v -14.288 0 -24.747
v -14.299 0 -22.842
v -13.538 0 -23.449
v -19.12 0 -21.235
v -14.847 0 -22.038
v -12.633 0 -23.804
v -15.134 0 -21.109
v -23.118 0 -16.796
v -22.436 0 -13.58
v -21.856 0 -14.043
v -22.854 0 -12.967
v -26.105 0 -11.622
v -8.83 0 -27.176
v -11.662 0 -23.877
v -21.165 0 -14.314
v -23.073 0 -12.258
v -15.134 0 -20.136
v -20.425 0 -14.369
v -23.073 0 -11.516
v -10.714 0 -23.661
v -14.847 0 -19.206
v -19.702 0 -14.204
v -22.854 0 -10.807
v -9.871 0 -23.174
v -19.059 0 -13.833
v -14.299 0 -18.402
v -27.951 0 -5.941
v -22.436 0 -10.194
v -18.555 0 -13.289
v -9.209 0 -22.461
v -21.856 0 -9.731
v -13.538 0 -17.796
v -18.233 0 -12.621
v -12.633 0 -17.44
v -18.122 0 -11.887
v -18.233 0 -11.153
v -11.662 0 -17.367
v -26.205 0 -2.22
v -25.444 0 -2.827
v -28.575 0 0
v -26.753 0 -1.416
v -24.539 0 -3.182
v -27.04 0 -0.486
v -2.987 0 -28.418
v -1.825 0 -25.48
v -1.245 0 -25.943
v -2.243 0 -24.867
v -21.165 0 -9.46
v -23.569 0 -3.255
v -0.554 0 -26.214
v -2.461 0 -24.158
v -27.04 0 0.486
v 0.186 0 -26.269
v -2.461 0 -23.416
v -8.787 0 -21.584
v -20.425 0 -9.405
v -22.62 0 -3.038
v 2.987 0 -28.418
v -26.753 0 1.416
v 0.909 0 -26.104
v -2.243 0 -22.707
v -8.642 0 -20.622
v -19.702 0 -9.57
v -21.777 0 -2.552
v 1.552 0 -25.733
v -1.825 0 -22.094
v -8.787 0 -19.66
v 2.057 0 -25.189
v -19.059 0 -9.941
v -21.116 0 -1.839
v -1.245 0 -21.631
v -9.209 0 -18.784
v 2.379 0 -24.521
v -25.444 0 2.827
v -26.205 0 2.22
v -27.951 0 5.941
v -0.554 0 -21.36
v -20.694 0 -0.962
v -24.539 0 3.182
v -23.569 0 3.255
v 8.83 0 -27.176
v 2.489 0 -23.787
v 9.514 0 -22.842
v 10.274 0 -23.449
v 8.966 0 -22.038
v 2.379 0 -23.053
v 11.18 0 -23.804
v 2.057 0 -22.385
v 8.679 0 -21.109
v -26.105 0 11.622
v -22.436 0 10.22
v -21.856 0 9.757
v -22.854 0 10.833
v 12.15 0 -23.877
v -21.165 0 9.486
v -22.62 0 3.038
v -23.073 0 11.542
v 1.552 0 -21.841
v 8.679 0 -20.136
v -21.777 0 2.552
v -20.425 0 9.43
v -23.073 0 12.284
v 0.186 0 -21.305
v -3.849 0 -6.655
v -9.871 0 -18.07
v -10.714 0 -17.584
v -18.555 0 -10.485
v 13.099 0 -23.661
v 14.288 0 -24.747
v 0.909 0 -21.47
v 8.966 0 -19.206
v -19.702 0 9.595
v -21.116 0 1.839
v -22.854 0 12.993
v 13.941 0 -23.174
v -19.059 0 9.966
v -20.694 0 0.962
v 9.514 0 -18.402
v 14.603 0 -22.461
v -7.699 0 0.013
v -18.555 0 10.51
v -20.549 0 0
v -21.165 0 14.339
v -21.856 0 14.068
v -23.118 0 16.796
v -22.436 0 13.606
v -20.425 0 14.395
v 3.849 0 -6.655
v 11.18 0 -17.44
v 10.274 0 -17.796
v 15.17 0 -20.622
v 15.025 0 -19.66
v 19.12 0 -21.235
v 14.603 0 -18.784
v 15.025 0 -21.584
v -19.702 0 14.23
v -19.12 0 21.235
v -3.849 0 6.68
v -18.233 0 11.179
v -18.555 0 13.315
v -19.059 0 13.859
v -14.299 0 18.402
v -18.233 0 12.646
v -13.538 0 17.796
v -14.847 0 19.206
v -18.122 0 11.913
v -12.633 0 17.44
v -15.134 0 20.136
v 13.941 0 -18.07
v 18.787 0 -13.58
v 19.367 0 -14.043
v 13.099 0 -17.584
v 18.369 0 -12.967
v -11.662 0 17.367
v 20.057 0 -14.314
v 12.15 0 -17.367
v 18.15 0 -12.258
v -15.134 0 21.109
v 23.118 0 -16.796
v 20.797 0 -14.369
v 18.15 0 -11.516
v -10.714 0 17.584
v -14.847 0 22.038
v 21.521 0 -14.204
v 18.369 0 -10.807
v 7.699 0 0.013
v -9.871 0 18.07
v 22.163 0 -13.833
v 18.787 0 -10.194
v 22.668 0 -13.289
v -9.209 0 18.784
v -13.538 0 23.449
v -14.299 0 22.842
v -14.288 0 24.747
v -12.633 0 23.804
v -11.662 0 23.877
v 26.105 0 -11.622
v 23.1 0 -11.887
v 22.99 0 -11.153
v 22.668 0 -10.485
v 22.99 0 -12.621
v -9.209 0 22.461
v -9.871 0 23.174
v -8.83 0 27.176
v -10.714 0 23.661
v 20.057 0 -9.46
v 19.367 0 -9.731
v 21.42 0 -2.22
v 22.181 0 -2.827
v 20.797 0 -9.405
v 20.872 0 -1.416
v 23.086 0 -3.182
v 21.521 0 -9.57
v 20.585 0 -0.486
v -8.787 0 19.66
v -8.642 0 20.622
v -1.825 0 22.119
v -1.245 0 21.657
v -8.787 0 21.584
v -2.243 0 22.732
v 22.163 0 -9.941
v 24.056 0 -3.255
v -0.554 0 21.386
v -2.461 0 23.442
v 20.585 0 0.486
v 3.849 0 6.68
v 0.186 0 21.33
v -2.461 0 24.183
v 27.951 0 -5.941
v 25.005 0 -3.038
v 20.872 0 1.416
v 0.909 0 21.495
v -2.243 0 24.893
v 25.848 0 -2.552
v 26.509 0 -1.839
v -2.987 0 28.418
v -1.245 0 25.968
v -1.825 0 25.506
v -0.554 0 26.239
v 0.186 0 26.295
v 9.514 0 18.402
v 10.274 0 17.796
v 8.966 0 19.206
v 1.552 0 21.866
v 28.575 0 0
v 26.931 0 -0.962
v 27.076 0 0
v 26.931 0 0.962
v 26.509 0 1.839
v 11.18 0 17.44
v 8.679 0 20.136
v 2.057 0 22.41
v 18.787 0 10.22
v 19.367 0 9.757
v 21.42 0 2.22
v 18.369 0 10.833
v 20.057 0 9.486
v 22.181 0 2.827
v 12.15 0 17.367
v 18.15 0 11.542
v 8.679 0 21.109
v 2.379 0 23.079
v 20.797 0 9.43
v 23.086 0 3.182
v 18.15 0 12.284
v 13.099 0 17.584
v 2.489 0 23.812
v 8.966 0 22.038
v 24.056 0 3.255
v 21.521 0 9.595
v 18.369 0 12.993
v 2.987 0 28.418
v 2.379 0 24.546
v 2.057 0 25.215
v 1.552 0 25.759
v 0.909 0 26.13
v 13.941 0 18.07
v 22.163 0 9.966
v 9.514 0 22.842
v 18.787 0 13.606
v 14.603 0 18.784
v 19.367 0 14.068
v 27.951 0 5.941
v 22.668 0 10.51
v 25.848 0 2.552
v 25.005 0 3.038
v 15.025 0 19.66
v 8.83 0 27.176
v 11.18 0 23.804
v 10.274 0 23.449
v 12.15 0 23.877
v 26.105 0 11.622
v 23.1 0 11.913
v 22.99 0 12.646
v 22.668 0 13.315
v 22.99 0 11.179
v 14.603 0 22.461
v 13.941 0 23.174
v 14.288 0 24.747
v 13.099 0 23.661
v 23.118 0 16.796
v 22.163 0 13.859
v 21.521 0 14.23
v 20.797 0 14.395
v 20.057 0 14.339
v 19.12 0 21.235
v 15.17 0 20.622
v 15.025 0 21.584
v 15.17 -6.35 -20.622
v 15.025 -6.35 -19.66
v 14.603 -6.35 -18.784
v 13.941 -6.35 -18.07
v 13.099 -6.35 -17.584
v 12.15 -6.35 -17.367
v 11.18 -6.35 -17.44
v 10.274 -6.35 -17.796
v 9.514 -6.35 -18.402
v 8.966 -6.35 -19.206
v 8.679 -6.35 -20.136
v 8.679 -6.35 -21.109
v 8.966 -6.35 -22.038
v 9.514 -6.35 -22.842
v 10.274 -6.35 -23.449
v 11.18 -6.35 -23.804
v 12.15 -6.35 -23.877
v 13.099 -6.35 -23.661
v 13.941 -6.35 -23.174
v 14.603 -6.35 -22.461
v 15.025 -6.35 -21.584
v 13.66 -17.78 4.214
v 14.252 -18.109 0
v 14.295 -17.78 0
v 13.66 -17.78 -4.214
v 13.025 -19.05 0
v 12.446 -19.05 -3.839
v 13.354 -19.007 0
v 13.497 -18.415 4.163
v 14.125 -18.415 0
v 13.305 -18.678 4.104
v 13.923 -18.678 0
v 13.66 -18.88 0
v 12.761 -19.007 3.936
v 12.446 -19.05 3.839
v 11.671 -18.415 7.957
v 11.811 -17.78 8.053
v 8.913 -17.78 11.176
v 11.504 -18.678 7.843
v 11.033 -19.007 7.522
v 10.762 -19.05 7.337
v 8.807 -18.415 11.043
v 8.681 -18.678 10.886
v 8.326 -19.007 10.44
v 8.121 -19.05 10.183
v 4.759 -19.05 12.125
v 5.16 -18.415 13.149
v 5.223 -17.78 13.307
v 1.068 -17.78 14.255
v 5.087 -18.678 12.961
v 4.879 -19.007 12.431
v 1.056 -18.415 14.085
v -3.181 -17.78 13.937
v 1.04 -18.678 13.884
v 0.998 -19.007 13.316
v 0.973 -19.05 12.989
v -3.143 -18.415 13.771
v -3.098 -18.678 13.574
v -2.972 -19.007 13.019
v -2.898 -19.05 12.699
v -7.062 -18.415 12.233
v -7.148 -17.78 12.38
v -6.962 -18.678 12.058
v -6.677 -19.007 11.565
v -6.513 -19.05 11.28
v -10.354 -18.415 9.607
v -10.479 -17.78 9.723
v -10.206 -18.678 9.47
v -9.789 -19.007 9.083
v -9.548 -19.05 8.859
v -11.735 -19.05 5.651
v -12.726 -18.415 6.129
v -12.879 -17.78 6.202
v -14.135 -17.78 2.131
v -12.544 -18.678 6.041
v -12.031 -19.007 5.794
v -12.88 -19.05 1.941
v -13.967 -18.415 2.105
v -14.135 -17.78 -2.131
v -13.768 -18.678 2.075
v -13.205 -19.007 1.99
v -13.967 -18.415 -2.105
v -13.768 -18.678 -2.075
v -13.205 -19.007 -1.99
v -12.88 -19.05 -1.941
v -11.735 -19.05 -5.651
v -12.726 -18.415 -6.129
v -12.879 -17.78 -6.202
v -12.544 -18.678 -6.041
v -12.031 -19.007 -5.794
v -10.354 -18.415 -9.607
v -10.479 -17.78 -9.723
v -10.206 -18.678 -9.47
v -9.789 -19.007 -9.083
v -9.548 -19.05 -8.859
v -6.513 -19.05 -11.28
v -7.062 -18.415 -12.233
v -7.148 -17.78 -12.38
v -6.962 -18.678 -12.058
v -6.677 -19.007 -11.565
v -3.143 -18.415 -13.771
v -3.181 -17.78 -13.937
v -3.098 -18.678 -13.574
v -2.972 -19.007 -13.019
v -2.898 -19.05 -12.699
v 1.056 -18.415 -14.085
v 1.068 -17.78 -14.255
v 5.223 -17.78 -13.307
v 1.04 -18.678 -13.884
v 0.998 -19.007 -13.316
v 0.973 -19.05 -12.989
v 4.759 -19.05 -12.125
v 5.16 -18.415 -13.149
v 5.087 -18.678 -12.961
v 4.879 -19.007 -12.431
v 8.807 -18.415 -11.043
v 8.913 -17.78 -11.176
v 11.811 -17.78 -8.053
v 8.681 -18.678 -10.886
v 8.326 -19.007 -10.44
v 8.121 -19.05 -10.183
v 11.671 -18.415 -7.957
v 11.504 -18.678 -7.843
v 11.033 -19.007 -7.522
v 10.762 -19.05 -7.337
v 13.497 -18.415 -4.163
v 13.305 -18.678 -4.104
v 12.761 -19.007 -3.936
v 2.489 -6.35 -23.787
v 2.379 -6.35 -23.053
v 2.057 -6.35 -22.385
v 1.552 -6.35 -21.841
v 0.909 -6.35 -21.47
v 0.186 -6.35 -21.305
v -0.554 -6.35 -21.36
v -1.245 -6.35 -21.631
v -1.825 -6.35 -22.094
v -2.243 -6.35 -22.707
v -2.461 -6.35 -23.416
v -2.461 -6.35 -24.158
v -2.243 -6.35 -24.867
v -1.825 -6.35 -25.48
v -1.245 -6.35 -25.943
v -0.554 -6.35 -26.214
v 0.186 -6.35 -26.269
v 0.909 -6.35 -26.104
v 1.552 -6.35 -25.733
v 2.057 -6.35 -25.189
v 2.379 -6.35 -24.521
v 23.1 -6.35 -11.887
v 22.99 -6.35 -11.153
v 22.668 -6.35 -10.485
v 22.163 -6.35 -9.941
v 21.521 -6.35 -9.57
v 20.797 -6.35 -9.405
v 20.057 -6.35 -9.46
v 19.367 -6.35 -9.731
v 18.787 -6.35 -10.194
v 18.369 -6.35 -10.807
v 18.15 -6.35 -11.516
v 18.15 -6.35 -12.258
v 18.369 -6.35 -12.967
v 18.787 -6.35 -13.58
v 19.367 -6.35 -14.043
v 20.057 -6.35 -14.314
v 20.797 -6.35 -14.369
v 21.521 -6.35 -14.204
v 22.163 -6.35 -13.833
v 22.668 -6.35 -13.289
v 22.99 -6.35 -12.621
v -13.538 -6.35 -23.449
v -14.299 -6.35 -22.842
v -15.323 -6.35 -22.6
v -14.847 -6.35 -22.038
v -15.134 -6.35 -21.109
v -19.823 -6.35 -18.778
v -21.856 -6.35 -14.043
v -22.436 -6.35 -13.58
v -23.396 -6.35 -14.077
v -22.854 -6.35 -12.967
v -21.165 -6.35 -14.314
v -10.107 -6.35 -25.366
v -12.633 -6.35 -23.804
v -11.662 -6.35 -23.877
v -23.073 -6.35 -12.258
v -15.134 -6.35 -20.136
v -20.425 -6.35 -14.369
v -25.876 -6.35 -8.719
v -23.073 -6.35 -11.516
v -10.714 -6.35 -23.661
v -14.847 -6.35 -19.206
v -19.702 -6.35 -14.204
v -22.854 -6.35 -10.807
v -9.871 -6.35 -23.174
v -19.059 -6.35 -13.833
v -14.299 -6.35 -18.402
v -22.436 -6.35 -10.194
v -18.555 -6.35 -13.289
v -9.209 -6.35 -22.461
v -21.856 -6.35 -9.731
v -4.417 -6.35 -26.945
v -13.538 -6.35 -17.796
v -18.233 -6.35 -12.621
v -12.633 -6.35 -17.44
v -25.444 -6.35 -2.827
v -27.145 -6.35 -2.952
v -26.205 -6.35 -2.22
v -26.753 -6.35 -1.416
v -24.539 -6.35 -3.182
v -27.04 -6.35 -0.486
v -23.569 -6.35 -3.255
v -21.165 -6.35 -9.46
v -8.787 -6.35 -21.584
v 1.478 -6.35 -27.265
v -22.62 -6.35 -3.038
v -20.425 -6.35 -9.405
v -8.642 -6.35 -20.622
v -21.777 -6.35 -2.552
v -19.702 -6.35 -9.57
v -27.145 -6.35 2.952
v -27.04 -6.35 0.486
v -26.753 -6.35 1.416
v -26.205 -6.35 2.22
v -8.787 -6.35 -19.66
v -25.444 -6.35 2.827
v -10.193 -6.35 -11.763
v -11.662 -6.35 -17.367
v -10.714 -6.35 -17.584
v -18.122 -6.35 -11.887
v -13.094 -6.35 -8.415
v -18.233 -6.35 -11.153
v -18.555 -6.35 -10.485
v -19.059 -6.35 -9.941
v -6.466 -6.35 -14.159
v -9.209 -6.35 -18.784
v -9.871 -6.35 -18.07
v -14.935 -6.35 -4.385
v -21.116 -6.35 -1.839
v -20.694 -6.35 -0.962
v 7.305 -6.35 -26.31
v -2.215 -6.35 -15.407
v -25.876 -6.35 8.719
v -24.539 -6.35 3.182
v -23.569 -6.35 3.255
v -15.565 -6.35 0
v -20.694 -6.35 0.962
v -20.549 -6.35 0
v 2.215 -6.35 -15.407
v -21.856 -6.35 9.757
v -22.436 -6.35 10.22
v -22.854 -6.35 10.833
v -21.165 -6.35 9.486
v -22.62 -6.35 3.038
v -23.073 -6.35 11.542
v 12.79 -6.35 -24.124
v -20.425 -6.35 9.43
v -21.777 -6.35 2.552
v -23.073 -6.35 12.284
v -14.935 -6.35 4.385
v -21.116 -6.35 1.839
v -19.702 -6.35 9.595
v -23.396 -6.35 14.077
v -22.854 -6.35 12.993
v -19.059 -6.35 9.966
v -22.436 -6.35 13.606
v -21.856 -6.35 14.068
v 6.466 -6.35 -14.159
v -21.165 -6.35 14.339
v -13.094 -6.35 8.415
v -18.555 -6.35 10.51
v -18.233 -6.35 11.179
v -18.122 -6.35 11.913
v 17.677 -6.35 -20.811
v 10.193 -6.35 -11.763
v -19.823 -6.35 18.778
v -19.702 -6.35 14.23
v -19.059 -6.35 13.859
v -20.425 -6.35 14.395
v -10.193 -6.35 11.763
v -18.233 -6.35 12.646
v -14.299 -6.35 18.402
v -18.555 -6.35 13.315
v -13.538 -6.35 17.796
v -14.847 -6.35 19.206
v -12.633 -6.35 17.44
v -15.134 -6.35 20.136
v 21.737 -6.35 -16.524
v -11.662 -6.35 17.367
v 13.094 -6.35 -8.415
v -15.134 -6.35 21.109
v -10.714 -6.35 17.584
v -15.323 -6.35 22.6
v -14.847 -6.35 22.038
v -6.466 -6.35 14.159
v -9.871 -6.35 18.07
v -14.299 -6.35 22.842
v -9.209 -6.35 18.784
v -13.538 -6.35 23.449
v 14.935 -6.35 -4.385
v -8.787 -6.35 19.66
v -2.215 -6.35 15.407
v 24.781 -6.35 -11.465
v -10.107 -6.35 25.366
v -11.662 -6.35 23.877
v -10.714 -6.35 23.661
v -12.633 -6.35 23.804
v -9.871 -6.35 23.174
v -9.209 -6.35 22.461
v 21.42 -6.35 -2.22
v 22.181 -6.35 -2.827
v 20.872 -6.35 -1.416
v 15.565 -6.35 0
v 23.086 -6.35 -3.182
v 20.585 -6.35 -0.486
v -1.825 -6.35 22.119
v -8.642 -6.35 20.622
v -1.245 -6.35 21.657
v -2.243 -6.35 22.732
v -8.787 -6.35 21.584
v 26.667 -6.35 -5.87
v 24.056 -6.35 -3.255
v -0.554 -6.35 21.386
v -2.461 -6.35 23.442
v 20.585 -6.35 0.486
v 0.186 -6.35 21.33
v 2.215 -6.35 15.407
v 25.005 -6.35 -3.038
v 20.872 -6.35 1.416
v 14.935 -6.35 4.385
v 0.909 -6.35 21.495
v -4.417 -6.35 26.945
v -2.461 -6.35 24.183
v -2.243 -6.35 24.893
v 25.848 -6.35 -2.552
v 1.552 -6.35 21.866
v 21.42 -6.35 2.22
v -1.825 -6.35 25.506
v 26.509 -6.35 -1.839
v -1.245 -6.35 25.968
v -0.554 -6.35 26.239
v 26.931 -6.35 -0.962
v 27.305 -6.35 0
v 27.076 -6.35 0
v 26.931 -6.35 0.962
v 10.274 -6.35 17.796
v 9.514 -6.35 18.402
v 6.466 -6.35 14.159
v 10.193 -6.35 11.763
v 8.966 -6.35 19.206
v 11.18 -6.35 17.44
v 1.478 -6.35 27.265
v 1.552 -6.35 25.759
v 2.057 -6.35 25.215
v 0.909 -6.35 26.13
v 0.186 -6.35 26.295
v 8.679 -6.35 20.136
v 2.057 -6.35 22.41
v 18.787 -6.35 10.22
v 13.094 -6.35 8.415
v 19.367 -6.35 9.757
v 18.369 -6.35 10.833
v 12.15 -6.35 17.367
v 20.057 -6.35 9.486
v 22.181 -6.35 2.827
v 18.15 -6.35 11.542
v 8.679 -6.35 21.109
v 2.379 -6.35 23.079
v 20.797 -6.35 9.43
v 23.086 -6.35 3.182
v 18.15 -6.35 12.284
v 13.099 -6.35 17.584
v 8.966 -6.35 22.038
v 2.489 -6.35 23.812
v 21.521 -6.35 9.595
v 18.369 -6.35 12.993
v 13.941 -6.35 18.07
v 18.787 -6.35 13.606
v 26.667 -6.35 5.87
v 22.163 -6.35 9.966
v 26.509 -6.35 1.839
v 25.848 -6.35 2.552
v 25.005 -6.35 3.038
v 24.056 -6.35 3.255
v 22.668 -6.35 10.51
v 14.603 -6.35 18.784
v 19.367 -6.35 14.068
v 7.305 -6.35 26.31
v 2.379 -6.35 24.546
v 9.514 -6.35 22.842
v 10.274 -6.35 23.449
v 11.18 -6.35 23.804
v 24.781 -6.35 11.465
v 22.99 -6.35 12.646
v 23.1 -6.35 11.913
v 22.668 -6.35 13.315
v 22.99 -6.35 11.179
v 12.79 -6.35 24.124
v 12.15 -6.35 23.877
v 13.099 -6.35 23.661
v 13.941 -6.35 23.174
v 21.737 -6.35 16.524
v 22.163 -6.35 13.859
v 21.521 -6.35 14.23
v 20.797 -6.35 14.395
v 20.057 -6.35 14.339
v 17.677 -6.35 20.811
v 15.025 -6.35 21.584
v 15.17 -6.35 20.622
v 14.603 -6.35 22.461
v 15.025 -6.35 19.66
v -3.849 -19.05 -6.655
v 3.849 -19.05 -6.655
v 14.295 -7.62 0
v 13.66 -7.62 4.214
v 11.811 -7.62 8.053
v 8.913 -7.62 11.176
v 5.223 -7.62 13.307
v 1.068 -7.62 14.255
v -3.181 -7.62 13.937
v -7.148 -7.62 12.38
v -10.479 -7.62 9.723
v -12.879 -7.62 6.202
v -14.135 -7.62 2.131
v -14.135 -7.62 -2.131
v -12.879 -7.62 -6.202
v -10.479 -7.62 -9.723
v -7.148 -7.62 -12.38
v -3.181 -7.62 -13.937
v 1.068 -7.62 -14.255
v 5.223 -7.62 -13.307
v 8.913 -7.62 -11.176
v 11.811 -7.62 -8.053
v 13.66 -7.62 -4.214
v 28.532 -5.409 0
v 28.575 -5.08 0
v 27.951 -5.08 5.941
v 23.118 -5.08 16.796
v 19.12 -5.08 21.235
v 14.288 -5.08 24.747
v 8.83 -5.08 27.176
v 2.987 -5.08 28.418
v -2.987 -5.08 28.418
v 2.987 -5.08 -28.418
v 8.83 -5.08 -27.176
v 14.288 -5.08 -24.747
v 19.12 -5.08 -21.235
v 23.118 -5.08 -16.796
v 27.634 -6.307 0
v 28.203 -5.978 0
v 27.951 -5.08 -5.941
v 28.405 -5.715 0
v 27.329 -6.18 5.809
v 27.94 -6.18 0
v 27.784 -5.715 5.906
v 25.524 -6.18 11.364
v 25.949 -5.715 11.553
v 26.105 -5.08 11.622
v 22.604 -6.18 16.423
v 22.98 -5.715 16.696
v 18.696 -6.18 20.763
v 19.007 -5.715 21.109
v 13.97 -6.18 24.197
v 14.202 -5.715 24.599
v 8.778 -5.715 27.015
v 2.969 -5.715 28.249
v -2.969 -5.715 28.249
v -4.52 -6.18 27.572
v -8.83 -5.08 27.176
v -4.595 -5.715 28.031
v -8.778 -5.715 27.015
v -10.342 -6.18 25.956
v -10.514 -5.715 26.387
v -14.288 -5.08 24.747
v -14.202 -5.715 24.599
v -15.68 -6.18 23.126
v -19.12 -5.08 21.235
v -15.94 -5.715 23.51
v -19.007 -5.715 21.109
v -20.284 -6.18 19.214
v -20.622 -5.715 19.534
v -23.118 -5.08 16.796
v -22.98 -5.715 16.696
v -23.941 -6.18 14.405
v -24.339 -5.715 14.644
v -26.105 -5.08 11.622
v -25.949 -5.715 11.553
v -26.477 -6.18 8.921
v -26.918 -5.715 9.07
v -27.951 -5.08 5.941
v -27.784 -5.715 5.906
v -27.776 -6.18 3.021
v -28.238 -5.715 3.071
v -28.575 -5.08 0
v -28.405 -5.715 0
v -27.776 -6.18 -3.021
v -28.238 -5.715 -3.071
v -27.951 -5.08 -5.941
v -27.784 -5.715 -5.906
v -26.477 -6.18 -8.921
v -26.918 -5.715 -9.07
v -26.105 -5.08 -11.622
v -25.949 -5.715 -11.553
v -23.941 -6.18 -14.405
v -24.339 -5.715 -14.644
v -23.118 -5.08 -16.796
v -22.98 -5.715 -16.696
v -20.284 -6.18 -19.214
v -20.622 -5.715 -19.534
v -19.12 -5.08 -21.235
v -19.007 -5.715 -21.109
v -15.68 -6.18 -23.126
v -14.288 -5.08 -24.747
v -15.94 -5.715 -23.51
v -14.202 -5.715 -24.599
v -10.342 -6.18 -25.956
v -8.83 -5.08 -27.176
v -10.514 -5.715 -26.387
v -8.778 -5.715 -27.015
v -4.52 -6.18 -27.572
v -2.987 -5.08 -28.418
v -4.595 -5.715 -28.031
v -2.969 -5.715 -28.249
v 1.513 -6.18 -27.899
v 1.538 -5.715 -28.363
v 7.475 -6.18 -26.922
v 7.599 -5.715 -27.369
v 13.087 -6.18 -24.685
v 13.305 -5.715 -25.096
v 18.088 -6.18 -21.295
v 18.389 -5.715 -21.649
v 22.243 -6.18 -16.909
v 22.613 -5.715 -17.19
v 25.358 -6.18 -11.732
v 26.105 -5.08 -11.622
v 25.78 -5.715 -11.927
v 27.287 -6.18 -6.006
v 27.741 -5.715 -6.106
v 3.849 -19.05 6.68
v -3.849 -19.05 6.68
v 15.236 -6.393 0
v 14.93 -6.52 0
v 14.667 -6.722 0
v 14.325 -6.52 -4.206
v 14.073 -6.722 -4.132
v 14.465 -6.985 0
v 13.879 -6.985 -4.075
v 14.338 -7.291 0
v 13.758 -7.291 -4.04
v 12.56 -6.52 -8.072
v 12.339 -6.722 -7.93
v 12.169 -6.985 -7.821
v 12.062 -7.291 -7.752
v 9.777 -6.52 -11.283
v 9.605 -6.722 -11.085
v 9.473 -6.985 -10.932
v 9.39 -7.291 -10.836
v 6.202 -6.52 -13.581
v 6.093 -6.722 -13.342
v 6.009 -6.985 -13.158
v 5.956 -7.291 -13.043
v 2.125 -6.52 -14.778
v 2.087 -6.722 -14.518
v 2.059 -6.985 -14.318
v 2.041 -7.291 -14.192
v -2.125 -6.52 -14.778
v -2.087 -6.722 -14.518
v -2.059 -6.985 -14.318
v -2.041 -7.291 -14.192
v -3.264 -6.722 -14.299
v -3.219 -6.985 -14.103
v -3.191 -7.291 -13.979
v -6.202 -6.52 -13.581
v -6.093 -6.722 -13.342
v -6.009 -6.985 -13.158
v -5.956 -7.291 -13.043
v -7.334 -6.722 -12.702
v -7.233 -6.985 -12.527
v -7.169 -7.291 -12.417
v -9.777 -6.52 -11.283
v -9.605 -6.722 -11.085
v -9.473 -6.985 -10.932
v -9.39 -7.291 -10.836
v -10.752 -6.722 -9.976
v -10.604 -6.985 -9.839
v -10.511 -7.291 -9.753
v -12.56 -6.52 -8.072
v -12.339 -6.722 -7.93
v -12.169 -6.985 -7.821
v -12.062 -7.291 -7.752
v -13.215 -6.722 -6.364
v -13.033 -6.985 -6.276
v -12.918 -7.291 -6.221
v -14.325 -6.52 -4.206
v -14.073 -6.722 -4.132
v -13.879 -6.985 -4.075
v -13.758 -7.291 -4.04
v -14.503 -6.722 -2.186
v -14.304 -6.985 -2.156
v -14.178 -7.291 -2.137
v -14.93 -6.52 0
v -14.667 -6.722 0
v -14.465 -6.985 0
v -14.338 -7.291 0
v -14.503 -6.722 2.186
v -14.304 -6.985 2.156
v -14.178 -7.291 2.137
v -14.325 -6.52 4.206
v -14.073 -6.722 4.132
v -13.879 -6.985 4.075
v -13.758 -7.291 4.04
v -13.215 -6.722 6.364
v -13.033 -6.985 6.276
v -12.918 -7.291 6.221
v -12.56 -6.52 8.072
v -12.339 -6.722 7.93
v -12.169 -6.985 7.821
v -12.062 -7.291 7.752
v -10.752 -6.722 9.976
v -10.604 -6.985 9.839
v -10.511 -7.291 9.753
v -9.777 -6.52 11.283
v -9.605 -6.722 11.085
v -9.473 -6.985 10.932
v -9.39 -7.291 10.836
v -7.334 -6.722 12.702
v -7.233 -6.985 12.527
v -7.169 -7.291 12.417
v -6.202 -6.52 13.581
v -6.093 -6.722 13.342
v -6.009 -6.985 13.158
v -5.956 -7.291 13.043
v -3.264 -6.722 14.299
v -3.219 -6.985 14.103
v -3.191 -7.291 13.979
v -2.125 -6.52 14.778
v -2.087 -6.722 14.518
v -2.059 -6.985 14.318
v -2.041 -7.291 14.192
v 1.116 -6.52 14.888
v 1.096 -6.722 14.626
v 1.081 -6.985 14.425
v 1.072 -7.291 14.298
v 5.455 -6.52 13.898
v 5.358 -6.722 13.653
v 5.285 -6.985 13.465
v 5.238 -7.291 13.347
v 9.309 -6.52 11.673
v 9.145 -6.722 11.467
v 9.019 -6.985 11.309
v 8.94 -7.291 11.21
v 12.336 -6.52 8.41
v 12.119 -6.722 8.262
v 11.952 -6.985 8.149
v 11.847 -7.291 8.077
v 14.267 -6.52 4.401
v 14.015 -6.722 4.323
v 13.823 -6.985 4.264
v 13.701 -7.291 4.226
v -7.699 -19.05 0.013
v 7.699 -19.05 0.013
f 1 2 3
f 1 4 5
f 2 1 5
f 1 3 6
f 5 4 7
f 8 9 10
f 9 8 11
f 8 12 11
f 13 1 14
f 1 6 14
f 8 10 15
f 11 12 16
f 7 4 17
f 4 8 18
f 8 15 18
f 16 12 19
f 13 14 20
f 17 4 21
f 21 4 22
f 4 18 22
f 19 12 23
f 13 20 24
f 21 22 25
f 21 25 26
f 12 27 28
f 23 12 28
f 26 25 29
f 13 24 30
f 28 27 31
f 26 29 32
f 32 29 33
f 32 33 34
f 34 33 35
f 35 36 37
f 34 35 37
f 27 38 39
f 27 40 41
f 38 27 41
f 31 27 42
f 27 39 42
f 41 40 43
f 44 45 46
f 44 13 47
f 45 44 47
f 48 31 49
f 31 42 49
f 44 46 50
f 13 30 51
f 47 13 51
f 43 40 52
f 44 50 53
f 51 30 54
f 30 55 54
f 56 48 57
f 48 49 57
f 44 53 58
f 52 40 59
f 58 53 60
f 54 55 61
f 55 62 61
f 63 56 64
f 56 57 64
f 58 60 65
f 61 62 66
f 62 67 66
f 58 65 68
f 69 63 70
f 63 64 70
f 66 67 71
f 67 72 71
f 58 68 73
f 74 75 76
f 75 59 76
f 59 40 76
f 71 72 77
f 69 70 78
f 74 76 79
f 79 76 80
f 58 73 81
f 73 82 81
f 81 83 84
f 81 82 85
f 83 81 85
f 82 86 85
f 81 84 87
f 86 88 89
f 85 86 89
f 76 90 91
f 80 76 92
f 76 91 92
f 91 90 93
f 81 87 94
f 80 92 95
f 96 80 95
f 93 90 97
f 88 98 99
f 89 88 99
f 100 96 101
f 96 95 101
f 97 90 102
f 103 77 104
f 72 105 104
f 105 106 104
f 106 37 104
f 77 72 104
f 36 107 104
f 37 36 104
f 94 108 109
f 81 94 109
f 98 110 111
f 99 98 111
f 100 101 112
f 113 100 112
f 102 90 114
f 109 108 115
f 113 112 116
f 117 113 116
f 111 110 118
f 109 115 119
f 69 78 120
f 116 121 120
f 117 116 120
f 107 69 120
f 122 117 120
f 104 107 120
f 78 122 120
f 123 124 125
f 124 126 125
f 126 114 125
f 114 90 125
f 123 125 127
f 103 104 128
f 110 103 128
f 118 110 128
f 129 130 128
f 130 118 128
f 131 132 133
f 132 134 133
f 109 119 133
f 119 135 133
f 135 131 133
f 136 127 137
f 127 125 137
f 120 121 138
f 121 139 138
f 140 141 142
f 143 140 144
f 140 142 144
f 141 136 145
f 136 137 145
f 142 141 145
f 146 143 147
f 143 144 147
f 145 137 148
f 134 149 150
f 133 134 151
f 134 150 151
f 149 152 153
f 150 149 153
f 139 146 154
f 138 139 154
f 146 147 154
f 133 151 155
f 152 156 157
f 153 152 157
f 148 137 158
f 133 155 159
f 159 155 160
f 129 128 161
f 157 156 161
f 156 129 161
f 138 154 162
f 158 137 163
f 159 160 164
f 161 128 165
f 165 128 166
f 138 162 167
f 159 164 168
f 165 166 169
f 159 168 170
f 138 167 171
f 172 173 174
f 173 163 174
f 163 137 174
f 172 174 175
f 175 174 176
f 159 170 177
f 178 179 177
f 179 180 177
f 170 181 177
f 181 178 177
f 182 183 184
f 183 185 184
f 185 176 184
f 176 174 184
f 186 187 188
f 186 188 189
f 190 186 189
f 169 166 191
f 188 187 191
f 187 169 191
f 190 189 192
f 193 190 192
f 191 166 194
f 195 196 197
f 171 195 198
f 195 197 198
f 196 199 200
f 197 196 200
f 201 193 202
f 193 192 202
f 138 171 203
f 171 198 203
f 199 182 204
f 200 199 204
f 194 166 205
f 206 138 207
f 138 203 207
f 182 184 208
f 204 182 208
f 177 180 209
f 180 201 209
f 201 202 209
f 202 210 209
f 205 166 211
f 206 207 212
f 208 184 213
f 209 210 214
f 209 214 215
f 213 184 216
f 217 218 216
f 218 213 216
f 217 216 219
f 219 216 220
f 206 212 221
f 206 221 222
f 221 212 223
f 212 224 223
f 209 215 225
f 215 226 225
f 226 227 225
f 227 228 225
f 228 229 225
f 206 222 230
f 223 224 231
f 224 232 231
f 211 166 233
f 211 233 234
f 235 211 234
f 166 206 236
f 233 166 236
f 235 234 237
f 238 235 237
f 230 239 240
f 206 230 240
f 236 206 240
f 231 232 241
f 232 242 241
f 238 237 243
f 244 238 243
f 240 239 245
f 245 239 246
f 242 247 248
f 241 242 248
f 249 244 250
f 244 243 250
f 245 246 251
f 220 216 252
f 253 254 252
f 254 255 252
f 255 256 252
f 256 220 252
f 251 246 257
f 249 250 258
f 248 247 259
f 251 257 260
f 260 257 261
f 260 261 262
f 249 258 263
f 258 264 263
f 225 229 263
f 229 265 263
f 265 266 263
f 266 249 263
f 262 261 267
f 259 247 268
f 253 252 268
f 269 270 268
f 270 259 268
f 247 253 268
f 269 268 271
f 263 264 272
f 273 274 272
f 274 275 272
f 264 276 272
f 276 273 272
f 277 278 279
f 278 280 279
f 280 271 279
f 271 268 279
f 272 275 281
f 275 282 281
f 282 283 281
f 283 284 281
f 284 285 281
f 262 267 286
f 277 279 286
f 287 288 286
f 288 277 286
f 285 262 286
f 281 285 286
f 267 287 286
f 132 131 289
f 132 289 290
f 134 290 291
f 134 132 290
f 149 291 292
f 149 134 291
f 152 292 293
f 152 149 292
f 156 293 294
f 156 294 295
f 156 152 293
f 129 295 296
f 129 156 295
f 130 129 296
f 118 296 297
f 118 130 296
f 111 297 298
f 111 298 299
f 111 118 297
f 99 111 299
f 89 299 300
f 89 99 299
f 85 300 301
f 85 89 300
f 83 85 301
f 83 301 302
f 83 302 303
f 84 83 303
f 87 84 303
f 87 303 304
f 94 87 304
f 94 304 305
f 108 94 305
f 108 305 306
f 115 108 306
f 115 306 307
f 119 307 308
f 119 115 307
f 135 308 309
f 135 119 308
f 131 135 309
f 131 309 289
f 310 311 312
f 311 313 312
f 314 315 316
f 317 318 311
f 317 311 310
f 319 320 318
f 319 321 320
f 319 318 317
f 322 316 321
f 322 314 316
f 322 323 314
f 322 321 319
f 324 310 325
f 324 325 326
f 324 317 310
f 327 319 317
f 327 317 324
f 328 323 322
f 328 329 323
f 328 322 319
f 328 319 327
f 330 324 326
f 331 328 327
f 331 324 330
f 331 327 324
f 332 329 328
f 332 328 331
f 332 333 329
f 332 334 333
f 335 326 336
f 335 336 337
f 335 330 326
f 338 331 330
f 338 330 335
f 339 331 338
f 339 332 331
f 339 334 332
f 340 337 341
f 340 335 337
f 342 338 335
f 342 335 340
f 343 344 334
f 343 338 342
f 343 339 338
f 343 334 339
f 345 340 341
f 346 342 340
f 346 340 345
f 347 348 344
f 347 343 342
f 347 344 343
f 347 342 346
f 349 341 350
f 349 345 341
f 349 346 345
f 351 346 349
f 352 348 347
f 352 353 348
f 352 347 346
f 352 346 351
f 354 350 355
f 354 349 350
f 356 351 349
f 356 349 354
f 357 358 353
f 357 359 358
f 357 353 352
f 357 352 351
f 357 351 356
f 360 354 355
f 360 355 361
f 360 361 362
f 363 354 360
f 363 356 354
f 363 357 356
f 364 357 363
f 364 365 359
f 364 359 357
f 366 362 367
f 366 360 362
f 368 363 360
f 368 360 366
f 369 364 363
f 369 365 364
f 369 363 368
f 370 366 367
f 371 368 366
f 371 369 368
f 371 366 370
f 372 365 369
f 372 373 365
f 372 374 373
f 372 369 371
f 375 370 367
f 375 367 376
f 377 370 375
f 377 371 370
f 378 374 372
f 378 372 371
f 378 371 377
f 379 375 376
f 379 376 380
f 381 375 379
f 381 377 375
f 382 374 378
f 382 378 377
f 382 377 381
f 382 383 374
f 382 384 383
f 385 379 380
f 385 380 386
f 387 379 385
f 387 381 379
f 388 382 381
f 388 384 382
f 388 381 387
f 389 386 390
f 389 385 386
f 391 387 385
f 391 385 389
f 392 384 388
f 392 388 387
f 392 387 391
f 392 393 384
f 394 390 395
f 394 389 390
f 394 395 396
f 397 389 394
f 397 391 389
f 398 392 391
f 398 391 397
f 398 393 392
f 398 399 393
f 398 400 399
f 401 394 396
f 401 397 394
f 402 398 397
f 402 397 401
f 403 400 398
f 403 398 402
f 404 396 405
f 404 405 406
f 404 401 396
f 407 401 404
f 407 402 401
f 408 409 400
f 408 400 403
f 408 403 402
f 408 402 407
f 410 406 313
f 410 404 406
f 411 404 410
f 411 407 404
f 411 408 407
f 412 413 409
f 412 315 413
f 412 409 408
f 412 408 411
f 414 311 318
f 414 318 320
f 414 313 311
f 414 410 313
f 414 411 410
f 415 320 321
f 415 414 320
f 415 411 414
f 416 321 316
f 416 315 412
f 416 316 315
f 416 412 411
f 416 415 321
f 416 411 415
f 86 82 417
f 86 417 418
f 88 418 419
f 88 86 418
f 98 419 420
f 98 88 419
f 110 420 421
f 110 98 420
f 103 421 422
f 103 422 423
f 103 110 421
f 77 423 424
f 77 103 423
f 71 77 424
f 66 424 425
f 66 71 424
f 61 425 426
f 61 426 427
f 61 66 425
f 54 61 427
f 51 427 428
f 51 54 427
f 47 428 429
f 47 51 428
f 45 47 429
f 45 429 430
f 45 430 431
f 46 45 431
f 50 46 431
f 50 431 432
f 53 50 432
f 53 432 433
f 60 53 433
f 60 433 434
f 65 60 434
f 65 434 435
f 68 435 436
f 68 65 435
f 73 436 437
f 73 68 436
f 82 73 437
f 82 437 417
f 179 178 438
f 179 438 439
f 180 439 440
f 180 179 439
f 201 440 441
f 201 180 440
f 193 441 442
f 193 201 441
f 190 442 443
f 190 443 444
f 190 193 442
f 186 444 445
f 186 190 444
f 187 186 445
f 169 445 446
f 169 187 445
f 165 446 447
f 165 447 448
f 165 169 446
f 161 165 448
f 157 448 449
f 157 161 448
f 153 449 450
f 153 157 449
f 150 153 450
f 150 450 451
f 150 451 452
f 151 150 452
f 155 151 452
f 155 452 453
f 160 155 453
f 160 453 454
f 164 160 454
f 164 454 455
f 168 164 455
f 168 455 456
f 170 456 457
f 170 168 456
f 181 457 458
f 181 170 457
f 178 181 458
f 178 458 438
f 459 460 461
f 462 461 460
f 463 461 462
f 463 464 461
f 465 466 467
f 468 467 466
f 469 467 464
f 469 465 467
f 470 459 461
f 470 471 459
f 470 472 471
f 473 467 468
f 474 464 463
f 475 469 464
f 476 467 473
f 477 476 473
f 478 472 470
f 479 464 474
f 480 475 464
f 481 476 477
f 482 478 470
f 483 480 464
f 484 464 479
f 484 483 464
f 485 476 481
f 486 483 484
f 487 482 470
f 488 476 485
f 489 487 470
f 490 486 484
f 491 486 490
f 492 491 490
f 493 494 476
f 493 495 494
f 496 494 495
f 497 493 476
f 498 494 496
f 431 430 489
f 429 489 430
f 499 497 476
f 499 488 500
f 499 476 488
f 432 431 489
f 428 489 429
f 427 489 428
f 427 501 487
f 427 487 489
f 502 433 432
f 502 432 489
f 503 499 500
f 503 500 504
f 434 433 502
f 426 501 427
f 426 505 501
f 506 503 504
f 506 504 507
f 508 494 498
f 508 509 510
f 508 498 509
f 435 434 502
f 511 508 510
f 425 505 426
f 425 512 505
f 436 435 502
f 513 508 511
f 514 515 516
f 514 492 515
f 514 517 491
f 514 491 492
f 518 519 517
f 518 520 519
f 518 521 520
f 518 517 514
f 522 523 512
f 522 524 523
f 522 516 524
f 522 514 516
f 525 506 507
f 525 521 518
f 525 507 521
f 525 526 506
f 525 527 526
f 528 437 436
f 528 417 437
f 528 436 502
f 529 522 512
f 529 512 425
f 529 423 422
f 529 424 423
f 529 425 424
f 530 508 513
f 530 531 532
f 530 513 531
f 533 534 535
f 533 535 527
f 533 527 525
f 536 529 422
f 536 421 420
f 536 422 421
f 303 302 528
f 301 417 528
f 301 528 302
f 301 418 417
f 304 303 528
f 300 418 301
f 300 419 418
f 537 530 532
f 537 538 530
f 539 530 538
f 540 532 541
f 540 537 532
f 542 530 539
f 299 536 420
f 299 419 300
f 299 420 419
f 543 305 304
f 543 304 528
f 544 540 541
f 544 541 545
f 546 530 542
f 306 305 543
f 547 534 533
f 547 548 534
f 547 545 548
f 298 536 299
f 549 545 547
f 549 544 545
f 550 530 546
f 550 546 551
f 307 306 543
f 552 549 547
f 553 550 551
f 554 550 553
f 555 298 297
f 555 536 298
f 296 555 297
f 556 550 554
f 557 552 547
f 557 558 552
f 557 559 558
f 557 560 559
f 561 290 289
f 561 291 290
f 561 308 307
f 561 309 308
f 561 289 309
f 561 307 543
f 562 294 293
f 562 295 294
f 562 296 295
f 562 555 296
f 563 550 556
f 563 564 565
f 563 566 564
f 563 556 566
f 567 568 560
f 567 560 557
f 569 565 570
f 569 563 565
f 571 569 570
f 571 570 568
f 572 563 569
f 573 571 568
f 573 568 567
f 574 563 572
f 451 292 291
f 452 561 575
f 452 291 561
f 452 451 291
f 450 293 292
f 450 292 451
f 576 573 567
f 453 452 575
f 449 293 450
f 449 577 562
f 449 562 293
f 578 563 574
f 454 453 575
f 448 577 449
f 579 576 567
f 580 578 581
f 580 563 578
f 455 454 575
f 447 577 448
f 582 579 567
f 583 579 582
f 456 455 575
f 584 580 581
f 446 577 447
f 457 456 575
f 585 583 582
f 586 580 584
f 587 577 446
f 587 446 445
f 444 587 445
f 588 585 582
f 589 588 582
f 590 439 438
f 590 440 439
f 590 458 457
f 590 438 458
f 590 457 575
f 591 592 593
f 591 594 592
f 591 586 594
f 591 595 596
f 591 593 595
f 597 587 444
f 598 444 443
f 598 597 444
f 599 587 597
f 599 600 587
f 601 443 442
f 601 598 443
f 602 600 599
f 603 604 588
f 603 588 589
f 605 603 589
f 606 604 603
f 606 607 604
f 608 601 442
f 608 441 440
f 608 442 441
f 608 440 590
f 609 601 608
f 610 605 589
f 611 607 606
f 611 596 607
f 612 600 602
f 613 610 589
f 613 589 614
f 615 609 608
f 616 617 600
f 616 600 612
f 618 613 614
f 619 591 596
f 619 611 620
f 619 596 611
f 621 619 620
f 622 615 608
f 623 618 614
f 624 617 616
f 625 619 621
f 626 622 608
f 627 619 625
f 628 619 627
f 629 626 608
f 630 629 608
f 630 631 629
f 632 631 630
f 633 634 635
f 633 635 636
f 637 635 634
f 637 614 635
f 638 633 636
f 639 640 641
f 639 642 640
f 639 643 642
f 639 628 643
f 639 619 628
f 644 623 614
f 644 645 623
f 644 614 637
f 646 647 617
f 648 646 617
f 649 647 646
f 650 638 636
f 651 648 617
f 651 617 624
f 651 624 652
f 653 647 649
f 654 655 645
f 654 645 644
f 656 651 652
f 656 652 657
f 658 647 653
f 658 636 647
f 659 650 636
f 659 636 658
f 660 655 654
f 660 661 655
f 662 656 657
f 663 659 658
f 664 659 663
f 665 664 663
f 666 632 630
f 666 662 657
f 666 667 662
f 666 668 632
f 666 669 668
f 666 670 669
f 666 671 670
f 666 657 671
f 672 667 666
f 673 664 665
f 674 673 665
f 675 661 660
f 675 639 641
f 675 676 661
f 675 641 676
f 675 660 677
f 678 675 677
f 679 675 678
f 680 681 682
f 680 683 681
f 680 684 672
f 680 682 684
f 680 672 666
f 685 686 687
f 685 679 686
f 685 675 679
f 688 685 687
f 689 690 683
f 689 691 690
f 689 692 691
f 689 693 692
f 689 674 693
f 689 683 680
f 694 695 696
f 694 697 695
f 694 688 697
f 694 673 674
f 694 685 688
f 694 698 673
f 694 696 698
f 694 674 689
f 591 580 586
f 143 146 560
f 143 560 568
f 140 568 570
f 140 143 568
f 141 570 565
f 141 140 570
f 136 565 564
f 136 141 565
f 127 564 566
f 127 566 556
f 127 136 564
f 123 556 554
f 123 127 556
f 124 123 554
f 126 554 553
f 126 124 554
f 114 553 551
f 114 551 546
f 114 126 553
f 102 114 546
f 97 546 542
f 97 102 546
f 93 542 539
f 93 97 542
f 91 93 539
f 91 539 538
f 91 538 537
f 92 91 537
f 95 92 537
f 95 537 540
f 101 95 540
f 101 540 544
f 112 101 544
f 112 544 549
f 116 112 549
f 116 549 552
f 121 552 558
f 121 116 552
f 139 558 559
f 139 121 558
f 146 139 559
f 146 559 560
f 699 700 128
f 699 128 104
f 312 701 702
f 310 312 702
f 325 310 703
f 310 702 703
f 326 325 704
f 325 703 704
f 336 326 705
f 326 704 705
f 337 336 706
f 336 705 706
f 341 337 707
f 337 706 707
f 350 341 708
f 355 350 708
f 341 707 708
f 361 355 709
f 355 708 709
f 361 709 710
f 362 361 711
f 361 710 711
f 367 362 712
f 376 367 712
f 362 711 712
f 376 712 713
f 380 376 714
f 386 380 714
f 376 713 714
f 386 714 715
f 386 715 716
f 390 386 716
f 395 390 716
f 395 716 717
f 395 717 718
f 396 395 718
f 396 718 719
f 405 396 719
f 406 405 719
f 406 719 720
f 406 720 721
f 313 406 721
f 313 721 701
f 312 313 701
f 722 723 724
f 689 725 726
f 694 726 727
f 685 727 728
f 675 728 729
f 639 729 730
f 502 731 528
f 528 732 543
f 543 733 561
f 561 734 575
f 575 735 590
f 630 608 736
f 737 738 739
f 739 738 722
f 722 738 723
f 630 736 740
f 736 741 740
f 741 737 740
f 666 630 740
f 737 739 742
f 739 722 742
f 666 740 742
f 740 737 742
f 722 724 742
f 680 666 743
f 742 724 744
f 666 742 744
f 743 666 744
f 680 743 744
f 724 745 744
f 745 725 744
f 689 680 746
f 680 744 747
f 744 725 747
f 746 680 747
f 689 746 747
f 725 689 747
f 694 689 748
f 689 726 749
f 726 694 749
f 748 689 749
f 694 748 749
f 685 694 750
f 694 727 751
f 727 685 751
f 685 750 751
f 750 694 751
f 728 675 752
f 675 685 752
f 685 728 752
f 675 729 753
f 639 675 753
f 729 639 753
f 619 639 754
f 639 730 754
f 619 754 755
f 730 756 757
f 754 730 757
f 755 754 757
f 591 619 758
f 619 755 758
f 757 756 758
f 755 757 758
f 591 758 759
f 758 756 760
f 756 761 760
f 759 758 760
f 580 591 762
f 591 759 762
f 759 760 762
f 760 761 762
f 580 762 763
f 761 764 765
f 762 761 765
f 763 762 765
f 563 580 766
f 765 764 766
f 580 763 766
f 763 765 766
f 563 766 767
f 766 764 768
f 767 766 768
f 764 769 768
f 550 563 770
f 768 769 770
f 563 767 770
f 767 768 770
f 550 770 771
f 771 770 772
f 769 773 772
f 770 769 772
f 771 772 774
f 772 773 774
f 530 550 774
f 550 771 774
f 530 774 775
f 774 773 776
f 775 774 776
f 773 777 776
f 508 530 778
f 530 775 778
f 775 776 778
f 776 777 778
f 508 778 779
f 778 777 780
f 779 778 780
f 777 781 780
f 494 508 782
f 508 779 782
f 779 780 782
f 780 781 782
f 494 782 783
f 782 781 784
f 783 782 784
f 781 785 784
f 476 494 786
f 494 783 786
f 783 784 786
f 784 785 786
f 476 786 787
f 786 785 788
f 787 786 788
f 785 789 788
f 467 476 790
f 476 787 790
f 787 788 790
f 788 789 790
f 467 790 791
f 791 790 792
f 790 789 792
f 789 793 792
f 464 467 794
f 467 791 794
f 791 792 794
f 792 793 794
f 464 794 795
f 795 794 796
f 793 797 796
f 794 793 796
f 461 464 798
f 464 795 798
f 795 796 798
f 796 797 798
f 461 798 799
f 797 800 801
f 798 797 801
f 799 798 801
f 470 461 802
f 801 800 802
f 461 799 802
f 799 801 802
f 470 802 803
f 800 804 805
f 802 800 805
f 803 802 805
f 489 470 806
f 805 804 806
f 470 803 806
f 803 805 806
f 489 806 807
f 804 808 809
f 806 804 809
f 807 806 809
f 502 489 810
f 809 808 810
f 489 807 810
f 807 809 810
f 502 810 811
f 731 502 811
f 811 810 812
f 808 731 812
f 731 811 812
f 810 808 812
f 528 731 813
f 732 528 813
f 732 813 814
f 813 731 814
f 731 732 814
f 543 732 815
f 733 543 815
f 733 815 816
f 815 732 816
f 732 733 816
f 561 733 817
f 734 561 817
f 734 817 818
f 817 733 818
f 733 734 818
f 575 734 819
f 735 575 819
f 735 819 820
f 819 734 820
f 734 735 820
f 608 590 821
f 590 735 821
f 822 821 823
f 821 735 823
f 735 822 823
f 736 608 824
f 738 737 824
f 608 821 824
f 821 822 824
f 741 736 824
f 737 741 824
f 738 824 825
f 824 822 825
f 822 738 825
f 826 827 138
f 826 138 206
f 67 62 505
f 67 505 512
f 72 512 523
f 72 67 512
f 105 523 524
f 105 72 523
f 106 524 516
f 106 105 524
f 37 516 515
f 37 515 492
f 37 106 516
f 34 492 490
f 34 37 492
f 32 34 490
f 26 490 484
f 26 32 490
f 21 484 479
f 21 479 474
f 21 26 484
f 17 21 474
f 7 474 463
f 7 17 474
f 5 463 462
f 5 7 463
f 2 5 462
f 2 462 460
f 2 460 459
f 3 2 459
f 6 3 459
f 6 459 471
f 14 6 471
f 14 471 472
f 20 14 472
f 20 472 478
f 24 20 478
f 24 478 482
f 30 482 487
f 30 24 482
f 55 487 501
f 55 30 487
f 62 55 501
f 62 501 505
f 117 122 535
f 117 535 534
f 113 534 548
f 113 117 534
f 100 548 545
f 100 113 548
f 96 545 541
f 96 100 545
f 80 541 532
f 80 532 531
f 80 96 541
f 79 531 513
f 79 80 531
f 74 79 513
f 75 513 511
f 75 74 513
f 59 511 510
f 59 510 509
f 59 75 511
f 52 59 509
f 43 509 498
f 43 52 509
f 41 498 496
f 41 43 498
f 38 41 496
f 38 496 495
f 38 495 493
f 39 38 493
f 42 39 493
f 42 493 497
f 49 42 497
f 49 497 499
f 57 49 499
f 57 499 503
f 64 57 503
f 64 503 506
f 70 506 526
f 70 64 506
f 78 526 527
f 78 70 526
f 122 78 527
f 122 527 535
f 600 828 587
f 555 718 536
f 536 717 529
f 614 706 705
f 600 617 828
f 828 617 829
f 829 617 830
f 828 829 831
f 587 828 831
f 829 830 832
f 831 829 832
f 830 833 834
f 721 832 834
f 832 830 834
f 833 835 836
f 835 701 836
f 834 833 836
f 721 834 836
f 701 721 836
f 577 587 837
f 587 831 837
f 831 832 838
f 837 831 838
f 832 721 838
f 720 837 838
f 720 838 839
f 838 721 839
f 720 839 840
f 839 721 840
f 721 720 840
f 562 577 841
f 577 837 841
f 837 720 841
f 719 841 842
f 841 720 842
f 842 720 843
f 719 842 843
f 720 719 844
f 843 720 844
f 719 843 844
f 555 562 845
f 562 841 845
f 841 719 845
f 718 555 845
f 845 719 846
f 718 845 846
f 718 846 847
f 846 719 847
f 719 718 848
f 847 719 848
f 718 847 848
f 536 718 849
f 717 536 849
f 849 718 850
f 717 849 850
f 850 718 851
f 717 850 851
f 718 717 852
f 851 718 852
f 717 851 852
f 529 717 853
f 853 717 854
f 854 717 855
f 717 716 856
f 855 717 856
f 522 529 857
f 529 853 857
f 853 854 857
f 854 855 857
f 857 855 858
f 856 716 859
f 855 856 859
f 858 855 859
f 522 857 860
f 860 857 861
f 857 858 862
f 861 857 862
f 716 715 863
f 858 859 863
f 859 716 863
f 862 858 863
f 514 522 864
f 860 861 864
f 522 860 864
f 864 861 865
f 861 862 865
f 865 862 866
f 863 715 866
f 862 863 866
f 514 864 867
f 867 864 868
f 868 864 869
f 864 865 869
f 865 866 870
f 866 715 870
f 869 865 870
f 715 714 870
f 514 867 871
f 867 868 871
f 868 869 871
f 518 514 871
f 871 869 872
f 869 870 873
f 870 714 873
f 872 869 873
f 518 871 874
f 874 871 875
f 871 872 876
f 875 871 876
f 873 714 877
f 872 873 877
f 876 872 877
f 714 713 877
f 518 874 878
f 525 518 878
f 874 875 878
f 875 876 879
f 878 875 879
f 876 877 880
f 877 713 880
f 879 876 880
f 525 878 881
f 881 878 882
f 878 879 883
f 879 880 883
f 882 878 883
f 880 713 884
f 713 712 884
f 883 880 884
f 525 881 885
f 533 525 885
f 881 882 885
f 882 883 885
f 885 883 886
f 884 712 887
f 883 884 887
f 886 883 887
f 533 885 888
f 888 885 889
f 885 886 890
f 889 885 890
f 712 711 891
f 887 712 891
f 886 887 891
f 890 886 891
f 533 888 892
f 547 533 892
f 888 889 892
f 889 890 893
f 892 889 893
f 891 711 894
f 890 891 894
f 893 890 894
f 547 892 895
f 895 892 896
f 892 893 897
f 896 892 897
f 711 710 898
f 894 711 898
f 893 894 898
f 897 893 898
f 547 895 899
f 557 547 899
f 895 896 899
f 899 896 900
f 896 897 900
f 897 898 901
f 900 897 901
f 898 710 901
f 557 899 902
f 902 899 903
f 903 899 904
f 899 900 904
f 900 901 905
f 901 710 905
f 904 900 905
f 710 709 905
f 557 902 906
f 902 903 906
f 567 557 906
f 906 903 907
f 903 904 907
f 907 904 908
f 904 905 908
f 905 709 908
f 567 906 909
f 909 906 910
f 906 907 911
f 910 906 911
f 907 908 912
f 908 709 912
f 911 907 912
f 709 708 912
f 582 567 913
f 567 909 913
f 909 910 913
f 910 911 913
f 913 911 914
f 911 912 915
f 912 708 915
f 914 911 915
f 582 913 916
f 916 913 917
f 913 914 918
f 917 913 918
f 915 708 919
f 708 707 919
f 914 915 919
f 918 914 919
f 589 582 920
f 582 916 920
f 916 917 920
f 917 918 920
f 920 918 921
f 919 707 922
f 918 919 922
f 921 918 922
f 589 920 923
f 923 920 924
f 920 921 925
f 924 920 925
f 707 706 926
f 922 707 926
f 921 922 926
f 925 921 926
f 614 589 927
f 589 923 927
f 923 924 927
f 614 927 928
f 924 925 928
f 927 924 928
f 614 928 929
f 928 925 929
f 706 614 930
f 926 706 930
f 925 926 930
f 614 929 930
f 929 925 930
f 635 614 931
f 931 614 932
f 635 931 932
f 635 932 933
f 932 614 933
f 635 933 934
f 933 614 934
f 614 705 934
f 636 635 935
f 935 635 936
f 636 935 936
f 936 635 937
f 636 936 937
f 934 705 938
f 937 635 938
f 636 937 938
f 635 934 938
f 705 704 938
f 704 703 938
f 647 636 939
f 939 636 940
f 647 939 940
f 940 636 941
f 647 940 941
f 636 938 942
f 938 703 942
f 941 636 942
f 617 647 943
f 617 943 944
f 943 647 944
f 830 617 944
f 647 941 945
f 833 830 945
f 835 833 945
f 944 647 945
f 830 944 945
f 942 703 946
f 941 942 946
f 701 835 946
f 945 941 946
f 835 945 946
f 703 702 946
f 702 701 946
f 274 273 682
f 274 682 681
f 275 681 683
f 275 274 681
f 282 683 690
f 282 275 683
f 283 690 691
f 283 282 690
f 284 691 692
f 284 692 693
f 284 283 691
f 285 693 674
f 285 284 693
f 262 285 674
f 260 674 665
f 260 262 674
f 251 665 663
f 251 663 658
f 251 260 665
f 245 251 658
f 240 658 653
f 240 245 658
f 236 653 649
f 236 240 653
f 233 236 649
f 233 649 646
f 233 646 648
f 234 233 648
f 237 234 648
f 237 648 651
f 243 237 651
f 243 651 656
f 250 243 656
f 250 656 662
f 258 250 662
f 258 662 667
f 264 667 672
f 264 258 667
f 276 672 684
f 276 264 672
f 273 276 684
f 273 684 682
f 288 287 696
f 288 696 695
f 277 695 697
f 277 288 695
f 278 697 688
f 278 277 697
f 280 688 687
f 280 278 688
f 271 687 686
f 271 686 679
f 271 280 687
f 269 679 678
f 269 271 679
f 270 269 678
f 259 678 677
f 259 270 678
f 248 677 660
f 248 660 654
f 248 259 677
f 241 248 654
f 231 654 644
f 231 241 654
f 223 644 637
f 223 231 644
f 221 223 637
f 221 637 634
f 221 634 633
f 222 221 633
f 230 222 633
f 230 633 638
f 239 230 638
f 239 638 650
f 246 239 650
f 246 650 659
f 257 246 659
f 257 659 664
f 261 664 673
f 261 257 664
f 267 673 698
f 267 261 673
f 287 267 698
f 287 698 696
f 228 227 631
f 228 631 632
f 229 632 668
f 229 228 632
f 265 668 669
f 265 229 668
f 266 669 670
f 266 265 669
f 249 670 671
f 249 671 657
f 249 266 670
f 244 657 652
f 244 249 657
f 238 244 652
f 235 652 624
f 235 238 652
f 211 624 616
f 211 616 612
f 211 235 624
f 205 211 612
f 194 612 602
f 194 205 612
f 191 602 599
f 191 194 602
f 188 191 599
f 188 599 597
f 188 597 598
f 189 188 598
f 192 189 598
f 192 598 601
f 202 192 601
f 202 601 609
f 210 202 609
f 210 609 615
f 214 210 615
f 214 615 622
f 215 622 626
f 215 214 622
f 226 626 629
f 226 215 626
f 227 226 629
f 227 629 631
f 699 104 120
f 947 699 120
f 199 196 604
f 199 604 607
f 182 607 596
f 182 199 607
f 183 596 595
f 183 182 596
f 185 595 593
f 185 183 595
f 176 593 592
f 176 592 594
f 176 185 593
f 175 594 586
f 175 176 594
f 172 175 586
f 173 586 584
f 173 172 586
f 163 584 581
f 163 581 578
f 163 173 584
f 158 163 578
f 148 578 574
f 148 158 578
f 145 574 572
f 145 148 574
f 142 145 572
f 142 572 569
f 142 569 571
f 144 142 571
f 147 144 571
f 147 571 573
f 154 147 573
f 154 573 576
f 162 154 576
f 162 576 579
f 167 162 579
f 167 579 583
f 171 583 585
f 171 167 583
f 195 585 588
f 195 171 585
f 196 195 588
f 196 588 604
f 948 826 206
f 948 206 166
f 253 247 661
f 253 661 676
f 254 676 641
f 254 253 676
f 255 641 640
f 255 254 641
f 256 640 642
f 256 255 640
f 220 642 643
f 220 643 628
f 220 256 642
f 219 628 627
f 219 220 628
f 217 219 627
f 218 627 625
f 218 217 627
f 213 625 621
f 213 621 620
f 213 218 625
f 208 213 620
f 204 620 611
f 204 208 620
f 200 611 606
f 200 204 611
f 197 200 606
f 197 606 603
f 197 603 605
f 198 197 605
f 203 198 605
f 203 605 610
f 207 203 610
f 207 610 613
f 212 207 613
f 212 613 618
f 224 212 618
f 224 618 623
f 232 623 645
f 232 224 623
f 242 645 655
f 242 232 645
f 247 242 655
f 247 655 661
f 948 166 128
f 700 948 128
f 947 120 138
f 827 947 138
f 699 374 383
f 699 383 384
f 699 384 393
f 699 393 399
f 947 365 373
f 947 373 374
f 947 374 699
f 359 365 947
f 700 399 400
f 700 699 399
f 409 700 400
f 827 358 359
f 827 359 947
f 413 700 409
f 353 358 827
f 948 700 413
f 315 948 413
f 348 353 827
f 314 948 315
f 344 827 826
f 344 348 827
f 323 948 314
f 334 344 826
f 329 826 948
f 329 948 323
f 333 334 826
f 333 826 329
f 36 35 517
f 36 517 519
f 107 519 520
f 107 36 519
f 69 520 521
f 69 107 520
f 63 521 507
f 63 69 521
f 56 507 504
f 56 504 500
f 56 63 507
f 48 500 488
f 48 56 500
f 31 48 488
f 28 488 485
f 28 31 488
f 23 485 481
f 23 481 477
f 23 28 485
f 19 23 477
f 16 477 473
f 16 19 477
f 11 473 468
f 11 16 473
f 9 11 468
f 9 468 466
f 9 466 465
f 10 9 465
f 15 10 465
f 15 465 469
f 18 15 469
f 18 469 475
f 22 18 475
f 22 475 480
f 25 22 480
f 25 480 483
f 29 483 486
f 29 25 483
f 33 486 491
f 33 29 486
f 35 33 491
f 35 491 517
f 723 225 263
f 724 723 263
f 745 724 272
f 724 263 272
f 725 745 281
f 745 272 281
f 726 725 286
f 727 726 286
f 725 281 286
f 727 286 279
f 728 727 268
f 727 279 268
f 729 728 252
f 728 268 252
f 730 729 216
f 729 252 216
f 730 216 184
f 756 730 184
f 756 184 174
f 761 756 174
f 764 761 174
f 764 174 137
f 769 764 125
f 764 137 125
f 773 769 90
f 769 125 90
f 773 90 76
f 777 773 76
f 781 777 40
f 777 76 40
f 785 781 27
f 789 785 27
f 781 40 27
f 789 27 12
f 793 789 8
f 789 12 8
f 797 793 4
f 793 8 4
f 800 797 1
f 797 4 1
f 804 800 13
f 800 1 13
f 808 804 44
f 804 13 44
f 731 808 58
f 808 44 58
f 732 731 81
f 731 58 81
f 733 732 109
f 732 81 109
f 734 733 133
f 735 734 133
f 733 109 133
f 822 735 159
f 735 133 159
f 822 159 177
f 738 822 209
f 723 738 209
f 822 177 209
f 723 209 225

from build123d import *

# Parameters (mm, degrees)
F0_R     = 28.575
F0_R_2   = 3.2639
F0_R_3   = 2.4892
F0_R_4   = 14.29512
F1_DEPTH = 6.35
F2_DEPTH = 19.05
F3_R     = 1.27


with BuildPart() as f1:
    # F0 (on Front) → F1 (new body)
    with BuildSketch(Plane.XZ):
        Circle(F0_R)
        with Locations((-11.90625, -20.6222299276)):
            Circle(F0_R_2, mode=Mode.SUBTRACT)
        with Locations((-20.611231405, -11.8872)):
            Circle(F0_R_3, mode=Mode.SUBTRACT)
        with Locations((0, -23.7871)):
            Circle(F0_R_3, mode=Mode.SUBTRACT)
        with Locations((11.90625, -20.6222299276)):
            Circle(F0_R_2, mode=Mode.SUBTRACT)
        with Locations((20.611231405, -11.8872)):
            Circle(F0_R_3, mode=Mode.SUBTRACT)
        with Locations((-23.8125, 0)):
            Circle(F0_R_2, mode=Mode.SUBTRACT)
        with Locations((-20.611231405, 11.9126)):
            Circle(F0_R_3, mode=Mode.SUBTRACT)
        with Locations((-11.90625, 20.6222299276)):
            Circle(F0_R_2, mode=Mode.SUBTRACT)
        Circle(F0_R_4, mode=Mode.SUBTRACT)
        with Locations((23.8125, 0)):
            Circle(F0_R_2, mode=Mode.SUBTRACT)
        with Locations((20.611231405, 11.9126)):
            Circle(F0_R_3, mode=Mode.SUBTRACT)
        with Locations((11.90625, 20.6222299276)):
            Circle(F0_R_2, mode=Mode.SUBTRACT)
        with Locations((0, 23.8125)):
            Circle(F0_R_3, mode=Mode.SUBTRACT)
        Circle(F0_R_4)
        Polygon((-7.6989658396, 0.0127), (-3.8494829198, 6.6802), (3.8494829198, 6.6802), (7.6989658396, 0.0127), (3.8494829198, -6.6548), (-3.8494829198, -6.6548), align=None, mode=Mode.SUBTRACT)
    extrude(amount=F1_DEPTH)

    # F0 (on Front) → F2 (join)
    with BuildSketch(Plane.XZ):
        Circle(F0_R_4)
        Polygon((-7.6989658396, 0.0127), (-3.8494829198, 6.6802), (3.8494829198, 6.6802), (7.6989658396, 0.0127), (3.8494829198, -6.6548), (-3.8494829198, -6.6548), align=None, mode=Mode.SUBTRACT)
    extrude(amount=F2_DEPTH)

    # F3
    f3_edges = [f1.edges().sort_by_distance(p)[0] for p in [
        (-28.575, -6.35, 0),
        (-14.29512, -19.05, 0),
        (-14.29512, -6.35, 0),
    ]]
    fillet(f3_edges, radius=F3_R)


solid = f1.part
